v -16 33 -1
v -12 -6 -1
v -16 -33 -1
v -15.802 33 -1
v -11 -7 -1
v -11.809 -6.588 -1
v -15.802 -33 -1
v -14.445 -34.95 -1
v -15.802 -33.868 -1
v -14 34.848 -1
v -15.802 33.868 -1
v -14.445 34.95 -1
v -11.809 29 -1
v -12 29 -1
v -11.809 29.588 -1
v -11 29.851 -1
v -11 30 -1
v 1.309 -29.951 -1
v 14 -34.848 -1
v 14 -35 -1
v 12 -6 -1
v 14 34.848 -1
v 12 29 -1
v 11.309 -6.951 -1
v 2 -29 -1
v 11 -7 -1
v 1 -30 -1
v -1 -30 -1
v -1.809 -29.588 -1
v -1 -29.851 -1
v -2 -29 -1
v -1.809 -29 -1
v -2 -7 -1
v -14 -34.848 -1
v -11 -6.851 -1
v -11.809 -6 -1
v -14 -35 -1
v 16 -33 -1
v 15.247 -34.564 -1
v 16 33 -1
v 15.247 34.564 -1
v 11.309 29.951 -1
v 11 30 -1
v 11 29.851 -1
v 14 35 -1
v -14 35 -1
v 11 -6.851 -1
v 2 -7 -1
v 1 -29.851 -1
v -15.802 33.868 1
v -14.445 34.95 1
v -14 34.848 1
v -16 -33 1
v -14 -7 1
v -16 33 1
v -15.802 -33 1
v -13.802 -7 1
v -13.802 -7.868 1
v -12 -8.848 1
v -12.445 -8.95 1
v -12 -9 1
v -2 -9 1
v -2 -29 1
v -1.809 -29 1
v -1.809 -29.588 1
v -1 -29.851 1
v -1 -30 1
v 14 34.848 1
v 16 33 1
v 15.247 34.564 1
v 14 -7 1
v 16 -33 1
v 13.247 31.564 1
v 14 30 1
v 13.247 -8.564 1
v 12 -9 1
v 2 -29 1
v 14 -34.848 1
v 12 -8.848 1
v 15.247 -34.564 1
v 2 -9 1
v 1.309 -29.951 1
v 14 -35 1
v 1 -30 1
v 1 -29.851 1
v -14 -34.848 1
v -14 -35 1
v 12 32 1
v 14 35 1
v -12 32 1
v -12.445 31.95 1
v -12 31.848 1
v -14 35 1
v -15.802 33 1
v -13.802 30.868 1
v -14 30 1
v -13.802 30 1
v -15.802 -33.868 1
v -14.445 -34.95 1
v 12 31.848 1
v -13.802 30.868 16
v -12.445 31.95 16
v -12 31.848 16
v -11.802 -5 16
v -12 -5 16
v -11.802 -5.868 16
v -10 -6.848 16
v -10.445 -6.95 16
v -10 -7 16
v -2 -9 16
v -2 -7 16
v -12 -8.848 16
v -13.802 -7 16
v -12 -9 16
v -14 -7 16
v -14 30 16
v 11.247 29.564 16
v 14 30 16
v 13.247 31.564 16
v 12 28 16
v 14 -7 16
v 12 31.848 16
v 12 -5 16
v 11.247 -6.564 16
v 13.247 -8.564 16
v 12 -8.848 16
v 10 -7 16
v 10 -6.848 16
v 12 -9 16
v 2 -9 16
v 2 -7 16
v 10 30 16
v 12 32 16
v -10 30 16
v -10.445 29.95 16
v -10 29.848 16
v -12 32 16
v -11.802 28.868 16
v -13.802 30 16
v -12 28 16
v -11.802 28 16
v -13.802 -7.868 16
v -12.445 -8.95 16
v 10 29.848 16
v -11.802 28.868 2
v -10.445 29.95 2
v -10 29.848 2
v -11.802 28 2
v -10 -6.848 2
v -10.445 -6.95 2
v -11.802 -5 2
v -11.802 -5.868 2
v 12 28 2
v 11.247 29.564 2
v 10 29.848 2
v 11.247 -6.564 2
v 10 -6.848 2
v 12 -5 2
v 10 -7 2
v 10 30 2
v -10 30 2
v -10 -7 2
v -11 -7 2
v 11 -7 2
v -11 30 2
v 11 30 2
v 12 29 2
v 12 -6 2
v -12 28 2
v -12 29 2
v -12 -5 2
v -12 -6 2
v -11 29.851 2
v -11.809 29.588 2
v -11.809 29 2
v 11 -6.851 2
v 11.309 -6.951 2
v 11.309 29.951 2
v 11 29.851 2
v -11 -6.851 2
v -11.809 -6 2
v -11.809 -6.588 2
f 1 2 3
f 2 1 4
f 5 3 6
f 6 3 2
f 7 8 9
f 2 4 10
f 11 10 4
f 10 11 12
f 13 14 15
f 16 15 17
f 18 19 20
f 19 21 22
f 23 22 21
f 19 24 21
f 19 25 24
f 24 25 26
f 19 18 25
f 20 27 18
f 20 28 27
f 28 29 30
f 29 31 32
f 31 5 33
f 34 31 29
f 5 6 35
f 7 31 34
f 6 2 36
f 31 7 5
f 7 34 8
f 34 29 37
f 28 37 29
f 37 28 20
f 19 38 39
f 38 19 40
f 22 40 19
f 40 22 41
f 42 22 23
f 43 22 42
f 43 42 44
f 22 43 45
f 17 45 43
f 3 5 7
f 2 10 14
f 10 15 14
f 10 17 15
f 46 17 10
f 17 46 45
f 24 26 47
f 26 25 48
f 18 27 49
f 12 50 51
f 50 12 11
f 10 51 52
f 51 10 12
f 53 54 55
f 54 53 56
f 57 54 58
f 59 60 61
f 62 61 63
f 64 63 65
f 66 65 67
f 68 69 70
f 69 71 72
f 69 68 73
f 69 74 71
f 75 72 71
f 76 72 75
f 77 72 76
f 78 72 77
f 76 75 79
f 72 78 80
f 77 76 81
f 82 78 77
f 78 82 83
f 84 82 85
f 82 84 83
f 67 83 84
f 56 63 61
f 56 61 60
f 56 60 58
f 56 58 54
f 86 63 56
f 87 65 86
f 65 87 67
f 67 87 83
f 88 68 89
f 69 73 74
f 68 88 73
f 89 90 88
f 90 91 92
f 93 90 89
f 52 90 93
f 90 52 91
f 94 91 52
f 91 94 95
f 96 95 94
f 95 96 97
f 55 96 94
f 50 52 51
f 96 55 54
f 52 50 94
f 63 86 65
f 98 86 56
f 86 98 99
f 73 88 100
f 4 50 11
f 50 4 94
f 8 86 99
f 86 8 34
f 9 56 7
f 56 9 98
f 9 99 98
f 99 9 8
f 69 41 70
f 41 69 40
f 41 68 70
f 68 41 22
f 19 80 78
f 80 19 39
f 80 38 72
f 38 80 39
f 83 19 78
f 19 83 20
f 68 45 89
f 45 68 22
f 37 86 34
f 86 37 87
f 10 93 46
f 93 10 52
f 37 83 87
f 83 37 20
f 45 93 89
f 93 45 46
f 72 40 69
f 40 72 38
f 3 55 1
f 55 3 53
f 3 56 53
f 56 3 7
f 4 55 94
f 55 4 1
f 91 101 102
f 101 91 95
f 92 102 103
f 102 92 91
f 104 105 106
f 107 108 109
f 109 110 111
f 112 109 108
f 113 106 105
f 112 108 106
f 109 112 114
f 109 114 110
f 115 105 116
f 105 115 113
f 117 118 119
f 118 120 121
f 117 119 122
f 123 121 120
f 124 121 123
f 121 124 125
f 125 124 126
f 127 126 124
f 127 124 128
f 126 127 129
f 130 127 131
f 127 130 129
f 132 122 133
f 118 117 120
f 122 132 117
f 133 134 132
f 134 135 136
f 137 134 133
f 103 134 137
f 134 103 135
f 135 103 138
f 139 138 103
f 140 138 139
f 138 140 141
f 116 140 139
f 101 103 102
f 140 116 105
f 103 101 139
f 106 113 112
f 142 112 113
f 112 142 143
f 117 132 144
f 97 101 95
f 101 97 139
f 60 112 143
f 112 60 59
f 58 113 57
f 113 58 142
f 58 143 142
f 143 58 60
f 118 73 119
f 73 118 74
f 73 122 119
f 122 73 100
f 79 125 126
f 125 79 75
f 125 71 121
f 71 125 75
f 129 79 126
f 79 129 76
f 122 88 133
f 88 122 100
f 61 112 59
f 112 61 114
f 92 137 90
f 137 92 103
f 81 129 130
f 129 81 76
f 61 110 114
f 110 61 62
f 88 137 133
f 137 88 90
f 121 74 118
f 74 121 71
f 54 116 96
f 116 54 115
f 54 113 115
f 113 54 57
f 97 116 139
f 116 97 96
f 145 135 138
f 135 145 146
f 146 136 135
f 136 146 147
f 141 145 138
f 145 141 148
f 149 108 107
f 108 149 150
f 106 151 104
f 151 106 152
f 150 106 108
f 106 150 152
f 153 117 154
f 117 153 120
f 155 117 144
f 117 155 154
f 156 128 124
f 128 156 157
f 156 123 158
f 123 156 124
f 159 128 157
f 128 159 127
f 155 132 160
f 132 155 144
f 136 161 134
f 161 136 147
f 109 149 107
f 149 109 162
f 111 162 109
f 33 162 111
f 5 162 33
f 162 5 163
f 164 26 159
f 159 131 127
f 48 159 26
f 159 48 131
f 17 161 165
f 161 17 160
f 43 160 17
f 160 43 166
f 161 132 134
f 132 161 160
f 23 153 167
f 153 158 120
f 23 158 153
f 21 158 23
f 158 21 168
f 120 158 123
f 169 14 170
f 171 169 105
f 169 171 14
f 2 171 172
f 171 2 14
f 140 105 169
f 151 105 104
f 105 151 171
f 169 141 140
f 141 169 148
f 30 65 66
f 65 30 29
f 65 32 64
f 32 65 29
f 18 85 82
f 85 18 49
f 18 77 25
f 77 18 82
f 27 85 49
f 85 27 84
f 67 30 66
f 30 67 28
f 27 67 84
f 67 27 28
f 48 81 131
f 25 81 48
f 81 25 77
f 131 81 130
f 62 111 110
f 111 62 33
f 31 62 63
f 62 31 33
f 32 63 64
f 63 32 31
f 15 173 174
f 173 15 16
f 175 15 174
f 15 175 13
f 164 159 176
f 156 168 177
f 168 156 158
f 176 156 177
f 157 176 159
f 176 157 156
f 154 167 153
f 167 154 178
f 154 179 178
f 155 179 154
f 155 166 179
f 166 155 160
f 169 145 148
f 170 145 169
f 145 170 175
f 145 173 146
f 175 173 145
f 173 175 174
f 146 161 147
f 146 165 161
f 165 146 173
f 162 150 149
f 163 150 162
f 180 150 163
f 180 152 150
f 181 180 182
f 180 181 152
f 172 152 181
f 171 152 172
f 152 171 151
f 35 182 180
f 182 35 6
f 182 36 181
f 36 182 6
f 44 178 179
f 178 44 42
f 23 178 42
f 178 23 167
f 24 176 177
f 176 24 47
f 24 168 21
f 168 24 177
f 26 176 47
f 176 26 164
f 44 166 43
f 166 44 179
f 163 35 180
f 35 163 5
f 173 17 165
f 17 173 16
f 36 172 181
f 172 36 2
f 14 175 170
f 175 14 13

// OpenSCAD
use <MCAD/boxes.scad>

// 상수
THICK = 2;		//	껍질두께
HEIGHT = 16;	//	전체 홈 높이이
ROUND = 2;	//	상판굴곡
BASE = [32, 70, THICK];	//	상판
BIG = [1024, 1024, 1024];	//	절단면을 보기 위한 절단 물체(아주 큰거면 다됨)

// 주요 수치
BLADE_HOLE_WIDTH = 4;		// 날두께(2) + 여유(2)
BLADE_HOLE_HEIGHT = 60;	// 날너비(52) + 여유(8)
HILT_HOLE_WIDTH = 24;			//	손잡이두께(20) + 여유(4)
HILT_HOLE_HEIGHT = 33 + 4;		//	손잡이너비(33) + 여유(4)

// 텍스트 홈파기
// 상판(base)의 왼쪽 아래 기준준
module mark(name = "andold", height = 4, base = BASE, mx = ROUND * 2) {
	translate([-base[0] / 2 + mx, base[1] / 2 - mx, base[2] / 2 - height])
		rotate([180, 0, 0])
			linear_extrude(THICK, center = false)
				text(name, size = 1, language = "kr", font = "NanumGothic");
}

module hiltMold(inner, t = THICK, r = ROUND) {
	outter = inner + [t + 2, t + 2, 0];
	difference() {
		roundedBox(size=outter, radius = r, sidesonly = true);
		roundedBox(size=inner + [0, 0, 1], radius = r, sidesonly = true);
	}
}

// 긴홈, 손잡이가 밑에 있는 것것
module knife2() {
	difference() {	//	절단면을 보기위하여
		
		// 주 물체
		union() {
			//	홈파기
			difference() {
				union() {
					//	상판
					color(c=[0.8, 0.8, 0.8, 0.5])	roundedBox(size=BASE, radius = ROUND, sidesonly = true);

					//	손잡이집
					color(c=[0.3, 0.1, 0.0, 0.5])
						translate([0, -(BLADE_HOLE_HEIGHT - HILT_HOLE_HEIGHT) / 2 , -HEIGHT / 2])
							hiltMold([HILT_HOLE_WIDTH, HILT_HOLE_HEIGHT, HEIGHT], THICK, ROUND);
					//	태그
					//color(c=[0.1, 0.1, 0.1, 0.5])	mark("칼 No. 2", 0.2, BASE, ROUND * 2);
				}
				
				//	칼날홈파기
				roundedBox(size = [BLADE_HOLE_WIDTH, BLADE_HOLE_HEIGHT, HEIGHT * 4], radius = 1, sidesonly = true);

				// 손잡이 홈파기
				translate([0, -(BLADE_HOLE_HEIGHT - HILT_HOLE_HEIGHT) / 2 , 0])
					roundedBox(size = [HILT_HOLE_WIDTH, HILT_HOLE_HEIGHT, THICK + 2], radius = 1, sidesonly = true);

				//	꼬리표
				//mark("칼 No. 2", 0.2, BASE, ROUND);
			}

		}
		
		//	절단방법 기술
		//	translate([BIG[0] / 2, 0, 0]) roundedBox(size=BIG, radius = 0, sidesonly = false);	// x축 절단면 보기
		//	translate([0, BIG[1] / 2, 0]) roundedBox(size=BIG, radius = 0, sidesonly = false);	// y축 절단면 보기
		//	translate([0, 0, BIG[2] / 2]) roundedBox(size=BIG, radius = 0, sidesonly = false);	// z축 절단면 보기
	}

}

rotate([180, 0, 0])
	knife2();
